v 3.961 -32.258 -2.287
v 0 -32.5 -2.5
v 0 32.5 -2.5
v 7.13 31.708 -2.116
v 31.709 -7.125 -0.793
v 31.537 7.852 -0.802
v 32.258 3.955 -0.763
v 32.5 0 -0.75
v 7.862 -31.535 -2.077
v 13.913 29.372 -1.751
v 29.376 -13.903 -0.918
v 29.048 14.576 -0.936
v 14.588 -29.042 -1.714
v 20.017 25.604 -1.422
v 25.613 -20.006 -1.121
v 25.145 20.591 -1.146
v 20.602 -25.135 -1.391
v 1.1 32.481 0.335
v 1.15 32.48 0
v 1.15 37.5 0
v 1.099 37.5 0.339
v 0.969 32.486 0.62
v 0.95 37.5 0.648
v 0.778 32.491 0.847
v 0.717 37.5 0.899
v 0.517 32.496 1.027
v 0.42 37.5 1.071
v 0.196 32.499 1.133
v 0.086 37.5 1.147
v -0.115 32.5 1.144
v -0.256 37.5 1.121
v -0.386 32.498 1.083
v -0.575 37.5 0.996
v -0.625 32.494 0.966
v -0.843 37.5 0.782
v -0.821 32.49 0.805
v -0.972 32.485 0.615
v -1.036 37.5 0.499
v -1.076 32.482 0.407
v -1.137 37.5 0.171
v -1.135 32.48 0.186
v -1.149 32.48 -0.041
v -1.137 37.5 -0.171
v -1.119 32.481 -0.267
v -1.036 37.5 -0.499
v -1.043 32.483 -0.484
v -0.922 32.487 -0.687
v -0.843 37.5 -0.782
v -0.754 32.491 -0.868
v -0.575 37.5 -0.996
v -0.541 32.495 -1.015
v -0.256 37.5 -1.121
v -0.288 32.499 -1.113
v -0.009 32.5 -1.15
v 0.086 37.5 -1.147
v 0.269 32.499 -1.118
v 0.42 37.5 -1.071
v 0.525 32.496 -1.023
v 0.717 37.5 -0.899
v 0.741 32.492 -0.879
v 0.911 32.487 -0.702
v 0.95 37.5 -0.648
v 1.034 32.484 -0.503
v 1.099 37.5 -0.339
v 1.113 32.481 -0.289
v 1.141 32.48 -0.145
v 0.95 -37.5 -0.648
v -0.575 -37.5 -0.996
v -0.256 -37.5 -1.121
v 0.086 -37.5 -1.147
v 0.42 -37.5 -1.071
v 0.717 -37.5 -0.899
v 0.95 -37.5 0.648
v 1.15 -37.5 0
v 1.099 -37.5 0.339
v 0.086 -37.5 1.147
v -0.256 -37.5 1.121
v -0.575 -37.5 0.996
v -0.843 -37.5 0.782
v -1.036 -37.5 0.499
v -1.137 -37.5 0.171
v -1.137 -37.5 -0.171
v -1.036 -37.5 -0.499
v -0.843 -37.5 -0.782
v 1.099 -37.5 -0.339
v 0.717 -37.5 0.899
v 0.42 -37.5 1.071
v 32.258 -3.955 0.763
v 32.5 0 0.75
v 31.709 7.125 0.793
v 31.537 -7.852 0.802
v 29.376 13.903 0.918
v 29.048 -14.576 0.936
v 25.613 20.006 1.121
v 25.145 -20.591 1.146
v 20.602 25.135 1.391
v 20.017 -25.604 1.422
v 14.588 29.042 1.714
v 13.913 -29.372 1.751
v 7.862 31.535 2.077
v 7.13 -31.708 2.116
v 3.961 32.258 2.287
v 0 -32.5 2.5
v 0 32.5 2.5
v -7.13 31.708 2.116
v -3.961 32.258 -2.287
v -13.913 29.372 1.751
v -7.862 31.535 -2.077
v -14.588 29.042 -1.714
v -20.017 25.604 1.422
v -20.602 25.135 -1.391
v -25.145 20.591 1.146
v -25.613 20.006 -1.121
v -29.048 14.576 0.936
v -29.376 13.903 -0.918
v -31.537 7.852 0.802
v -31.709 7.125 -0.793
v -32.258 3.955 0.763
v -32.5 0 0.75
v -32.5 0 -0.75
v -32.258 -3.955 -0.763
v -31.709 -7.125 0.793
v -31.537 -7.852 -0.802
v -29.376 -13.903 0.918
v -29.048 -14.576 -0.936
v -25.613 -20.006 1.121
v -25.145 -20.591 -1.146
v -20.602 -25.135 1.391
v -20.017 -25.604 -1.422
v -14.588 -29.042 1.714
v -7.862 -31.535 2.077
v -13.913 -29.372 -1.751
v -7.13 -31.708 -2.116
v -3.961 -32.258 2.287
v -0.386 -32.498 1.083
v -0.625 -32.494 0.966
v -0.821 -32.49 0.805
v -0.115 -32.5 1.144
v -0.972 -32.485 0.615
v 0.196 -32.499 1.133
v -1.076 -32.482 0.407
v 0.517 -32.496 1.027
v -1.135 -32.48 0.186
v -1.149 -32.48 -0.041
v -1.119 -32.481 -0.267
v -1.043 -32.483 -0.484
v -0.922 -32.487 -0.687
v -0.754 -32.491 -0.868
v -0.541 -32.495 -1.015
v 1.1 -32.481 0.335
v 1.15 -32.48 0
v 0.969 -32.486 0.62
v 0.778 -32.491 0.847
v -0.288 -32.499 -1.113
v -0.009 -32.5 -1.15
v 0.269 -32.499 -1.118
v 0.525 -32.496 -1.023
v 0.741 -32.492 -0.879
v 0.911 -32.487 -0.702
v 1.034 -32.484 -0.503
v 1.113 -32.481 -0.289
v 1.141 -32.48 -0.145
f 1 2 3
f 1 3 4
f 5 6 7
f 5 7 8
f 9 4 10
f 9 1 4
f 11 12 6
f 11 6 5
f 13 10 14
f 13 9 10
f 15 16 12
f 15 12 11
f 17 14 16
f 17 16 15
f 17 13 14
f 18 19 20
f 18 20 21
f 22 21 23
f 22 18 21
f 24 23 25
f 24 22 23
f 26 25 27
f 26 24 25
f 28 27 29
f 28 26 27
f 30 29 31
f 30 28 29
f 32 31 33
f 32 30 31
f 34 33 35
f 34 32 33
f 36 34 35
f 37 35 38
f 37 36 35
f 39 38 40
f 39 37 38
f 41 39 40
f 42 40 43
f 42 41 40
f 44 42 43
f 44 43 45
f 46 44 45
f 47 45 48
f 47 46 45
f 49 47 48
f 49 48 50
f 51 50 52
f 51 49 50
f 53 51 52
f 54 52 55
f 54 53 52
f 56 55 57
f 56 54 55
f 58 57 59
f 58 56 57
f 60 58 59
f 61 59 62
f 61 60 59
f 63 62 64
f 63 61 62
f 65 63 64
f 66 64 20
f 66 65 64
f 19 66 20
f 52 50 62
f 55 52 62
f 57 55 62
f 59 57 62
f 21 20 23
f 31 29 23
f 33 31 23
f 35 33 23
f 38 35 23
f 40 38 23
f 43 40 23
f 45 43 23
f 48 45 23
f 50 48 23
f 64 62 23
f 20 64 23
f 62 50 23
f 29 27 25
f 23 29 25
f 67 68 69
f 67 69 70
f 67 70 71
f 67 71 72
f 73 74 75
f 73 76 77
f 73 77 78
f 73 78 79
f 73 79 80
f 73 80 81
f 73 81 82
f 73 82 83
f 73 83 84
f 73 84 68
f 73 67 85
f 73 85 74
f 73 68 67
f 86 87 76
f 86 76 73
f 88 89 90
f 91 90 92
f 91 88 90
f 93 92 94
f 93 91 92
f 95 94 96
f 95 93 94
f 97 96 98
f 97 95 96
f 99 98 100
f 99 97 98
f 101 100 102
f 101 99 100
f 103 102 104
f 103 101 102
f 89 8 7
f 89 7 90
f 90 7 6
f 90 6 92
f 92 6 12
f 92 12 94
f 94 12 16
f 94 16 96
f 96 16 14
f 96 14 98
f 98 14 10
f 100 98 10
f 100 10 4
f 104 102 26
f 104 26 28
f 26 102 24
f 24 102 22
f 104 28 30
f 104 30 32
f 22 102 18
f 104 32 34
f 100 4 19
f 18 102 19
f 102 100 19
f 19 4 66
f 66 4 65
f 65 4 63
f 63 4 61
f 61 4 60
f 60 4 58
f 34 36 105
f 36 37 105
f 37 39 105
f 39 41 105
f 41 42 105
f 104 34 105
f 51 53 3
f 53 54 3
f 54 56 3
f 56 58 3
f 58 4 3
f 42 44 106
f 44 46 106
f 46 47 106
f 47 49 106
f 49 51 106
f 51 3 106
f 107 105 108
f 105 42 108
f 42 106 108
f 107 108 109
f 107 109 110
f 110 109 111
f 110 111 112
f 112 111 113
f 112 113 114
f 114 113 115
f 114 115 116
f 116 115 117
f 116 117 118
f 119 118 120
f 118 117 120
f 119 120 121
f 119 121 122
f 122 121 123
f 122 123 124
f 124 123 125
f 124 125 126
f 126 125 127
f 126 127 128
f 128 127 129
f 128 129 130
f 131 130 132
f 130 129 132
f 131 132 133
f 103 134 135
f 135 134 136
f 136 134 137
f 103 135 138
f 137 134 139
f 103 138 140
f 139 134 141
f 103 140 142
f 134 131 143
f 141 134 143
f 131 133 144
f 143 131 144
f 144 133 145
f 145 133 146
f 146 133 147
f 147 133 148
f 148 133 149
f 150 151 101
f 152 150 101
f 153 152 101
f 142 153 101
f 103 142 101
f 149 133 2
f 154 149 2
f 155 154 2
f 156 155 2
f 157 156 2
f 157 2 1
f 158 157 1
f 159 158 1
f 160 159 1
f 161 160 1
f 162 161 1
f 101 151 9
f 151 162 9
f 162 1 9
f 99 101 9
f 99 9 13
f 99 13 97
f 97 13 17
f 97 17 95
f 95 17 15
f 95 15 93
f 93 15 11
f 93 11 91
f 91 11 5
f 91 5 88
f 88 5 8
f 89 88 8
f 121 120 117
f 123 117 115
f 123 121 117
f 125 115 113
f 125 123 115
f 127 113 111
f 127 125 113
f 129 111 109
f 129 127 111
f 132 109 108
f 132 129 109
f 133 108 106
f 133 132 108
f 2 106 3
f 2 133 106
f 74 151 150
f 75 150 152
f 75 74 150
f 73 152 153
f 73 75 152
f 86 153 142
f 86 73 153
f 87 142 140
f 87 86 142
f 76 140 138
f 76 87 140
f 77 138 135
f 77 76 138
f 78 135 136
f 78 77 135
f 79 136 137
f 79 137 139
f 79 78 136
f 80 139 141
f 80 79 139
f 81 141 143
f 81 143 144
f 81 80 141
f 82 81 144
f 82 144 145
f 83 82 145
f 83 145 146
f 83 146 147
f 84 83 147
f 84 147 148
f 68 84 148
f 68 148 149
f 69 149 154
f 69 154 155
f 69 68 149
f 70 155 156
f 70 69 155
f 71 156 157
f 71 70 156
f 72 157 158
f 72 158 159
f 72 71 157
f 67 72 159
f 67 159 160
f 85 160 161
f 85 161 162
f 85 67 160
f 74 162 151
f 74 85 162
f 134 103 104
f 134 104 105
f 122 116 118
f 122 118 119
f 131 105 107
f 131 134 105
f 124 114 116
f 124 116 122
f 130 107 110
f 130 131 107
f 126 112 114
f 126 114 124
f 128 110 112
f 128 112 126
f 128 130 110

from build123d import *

# Parameters (mm, degrees)
F1_DEPTH = 32.5
F2_W     = 70
F2_H     = 70
F2_R     = 32.5
F3_DEPTH = 5
F5_R     = 1.15
F6_DEPTH = 37.5


with BuildPart() as f1:
    # F0 (on Front) → F1 (new body, symmetric)
    with BuildSketch(Plane.XZ):
        Polygon((0, 2.5), (-32.5, 0.75), (-32.5, -0.75), (0, -2.5), (32.5, -0.75), (32.5, 0.75), align=None)
    extrude(amount=F1_DEPTH, both=True)


with BuildPart() as f3:
    # F2 (on Top) → F3 (new body, symmetric)
    with BuildSketch(Plane.XY):
        Rectangle(F2_W, F2_H)
        Circle(F2_R, mode=Mode.SUBTRACT)
    extrude(amount=F3_DEPTH, both=True)


with BuildPart() as f1_1:
    add(f1.part)

    # F4: cut F3
    add(f3.part, mode=Mode.SUBTRACT)

    # F5 (on Front) → F6 (join, symmetric)
    with BuildSketch(Plane.XZ):
        Circle(F5_R)
    extrude(amount=F6_DEPTH, both=True)


solid = f1_1.part
